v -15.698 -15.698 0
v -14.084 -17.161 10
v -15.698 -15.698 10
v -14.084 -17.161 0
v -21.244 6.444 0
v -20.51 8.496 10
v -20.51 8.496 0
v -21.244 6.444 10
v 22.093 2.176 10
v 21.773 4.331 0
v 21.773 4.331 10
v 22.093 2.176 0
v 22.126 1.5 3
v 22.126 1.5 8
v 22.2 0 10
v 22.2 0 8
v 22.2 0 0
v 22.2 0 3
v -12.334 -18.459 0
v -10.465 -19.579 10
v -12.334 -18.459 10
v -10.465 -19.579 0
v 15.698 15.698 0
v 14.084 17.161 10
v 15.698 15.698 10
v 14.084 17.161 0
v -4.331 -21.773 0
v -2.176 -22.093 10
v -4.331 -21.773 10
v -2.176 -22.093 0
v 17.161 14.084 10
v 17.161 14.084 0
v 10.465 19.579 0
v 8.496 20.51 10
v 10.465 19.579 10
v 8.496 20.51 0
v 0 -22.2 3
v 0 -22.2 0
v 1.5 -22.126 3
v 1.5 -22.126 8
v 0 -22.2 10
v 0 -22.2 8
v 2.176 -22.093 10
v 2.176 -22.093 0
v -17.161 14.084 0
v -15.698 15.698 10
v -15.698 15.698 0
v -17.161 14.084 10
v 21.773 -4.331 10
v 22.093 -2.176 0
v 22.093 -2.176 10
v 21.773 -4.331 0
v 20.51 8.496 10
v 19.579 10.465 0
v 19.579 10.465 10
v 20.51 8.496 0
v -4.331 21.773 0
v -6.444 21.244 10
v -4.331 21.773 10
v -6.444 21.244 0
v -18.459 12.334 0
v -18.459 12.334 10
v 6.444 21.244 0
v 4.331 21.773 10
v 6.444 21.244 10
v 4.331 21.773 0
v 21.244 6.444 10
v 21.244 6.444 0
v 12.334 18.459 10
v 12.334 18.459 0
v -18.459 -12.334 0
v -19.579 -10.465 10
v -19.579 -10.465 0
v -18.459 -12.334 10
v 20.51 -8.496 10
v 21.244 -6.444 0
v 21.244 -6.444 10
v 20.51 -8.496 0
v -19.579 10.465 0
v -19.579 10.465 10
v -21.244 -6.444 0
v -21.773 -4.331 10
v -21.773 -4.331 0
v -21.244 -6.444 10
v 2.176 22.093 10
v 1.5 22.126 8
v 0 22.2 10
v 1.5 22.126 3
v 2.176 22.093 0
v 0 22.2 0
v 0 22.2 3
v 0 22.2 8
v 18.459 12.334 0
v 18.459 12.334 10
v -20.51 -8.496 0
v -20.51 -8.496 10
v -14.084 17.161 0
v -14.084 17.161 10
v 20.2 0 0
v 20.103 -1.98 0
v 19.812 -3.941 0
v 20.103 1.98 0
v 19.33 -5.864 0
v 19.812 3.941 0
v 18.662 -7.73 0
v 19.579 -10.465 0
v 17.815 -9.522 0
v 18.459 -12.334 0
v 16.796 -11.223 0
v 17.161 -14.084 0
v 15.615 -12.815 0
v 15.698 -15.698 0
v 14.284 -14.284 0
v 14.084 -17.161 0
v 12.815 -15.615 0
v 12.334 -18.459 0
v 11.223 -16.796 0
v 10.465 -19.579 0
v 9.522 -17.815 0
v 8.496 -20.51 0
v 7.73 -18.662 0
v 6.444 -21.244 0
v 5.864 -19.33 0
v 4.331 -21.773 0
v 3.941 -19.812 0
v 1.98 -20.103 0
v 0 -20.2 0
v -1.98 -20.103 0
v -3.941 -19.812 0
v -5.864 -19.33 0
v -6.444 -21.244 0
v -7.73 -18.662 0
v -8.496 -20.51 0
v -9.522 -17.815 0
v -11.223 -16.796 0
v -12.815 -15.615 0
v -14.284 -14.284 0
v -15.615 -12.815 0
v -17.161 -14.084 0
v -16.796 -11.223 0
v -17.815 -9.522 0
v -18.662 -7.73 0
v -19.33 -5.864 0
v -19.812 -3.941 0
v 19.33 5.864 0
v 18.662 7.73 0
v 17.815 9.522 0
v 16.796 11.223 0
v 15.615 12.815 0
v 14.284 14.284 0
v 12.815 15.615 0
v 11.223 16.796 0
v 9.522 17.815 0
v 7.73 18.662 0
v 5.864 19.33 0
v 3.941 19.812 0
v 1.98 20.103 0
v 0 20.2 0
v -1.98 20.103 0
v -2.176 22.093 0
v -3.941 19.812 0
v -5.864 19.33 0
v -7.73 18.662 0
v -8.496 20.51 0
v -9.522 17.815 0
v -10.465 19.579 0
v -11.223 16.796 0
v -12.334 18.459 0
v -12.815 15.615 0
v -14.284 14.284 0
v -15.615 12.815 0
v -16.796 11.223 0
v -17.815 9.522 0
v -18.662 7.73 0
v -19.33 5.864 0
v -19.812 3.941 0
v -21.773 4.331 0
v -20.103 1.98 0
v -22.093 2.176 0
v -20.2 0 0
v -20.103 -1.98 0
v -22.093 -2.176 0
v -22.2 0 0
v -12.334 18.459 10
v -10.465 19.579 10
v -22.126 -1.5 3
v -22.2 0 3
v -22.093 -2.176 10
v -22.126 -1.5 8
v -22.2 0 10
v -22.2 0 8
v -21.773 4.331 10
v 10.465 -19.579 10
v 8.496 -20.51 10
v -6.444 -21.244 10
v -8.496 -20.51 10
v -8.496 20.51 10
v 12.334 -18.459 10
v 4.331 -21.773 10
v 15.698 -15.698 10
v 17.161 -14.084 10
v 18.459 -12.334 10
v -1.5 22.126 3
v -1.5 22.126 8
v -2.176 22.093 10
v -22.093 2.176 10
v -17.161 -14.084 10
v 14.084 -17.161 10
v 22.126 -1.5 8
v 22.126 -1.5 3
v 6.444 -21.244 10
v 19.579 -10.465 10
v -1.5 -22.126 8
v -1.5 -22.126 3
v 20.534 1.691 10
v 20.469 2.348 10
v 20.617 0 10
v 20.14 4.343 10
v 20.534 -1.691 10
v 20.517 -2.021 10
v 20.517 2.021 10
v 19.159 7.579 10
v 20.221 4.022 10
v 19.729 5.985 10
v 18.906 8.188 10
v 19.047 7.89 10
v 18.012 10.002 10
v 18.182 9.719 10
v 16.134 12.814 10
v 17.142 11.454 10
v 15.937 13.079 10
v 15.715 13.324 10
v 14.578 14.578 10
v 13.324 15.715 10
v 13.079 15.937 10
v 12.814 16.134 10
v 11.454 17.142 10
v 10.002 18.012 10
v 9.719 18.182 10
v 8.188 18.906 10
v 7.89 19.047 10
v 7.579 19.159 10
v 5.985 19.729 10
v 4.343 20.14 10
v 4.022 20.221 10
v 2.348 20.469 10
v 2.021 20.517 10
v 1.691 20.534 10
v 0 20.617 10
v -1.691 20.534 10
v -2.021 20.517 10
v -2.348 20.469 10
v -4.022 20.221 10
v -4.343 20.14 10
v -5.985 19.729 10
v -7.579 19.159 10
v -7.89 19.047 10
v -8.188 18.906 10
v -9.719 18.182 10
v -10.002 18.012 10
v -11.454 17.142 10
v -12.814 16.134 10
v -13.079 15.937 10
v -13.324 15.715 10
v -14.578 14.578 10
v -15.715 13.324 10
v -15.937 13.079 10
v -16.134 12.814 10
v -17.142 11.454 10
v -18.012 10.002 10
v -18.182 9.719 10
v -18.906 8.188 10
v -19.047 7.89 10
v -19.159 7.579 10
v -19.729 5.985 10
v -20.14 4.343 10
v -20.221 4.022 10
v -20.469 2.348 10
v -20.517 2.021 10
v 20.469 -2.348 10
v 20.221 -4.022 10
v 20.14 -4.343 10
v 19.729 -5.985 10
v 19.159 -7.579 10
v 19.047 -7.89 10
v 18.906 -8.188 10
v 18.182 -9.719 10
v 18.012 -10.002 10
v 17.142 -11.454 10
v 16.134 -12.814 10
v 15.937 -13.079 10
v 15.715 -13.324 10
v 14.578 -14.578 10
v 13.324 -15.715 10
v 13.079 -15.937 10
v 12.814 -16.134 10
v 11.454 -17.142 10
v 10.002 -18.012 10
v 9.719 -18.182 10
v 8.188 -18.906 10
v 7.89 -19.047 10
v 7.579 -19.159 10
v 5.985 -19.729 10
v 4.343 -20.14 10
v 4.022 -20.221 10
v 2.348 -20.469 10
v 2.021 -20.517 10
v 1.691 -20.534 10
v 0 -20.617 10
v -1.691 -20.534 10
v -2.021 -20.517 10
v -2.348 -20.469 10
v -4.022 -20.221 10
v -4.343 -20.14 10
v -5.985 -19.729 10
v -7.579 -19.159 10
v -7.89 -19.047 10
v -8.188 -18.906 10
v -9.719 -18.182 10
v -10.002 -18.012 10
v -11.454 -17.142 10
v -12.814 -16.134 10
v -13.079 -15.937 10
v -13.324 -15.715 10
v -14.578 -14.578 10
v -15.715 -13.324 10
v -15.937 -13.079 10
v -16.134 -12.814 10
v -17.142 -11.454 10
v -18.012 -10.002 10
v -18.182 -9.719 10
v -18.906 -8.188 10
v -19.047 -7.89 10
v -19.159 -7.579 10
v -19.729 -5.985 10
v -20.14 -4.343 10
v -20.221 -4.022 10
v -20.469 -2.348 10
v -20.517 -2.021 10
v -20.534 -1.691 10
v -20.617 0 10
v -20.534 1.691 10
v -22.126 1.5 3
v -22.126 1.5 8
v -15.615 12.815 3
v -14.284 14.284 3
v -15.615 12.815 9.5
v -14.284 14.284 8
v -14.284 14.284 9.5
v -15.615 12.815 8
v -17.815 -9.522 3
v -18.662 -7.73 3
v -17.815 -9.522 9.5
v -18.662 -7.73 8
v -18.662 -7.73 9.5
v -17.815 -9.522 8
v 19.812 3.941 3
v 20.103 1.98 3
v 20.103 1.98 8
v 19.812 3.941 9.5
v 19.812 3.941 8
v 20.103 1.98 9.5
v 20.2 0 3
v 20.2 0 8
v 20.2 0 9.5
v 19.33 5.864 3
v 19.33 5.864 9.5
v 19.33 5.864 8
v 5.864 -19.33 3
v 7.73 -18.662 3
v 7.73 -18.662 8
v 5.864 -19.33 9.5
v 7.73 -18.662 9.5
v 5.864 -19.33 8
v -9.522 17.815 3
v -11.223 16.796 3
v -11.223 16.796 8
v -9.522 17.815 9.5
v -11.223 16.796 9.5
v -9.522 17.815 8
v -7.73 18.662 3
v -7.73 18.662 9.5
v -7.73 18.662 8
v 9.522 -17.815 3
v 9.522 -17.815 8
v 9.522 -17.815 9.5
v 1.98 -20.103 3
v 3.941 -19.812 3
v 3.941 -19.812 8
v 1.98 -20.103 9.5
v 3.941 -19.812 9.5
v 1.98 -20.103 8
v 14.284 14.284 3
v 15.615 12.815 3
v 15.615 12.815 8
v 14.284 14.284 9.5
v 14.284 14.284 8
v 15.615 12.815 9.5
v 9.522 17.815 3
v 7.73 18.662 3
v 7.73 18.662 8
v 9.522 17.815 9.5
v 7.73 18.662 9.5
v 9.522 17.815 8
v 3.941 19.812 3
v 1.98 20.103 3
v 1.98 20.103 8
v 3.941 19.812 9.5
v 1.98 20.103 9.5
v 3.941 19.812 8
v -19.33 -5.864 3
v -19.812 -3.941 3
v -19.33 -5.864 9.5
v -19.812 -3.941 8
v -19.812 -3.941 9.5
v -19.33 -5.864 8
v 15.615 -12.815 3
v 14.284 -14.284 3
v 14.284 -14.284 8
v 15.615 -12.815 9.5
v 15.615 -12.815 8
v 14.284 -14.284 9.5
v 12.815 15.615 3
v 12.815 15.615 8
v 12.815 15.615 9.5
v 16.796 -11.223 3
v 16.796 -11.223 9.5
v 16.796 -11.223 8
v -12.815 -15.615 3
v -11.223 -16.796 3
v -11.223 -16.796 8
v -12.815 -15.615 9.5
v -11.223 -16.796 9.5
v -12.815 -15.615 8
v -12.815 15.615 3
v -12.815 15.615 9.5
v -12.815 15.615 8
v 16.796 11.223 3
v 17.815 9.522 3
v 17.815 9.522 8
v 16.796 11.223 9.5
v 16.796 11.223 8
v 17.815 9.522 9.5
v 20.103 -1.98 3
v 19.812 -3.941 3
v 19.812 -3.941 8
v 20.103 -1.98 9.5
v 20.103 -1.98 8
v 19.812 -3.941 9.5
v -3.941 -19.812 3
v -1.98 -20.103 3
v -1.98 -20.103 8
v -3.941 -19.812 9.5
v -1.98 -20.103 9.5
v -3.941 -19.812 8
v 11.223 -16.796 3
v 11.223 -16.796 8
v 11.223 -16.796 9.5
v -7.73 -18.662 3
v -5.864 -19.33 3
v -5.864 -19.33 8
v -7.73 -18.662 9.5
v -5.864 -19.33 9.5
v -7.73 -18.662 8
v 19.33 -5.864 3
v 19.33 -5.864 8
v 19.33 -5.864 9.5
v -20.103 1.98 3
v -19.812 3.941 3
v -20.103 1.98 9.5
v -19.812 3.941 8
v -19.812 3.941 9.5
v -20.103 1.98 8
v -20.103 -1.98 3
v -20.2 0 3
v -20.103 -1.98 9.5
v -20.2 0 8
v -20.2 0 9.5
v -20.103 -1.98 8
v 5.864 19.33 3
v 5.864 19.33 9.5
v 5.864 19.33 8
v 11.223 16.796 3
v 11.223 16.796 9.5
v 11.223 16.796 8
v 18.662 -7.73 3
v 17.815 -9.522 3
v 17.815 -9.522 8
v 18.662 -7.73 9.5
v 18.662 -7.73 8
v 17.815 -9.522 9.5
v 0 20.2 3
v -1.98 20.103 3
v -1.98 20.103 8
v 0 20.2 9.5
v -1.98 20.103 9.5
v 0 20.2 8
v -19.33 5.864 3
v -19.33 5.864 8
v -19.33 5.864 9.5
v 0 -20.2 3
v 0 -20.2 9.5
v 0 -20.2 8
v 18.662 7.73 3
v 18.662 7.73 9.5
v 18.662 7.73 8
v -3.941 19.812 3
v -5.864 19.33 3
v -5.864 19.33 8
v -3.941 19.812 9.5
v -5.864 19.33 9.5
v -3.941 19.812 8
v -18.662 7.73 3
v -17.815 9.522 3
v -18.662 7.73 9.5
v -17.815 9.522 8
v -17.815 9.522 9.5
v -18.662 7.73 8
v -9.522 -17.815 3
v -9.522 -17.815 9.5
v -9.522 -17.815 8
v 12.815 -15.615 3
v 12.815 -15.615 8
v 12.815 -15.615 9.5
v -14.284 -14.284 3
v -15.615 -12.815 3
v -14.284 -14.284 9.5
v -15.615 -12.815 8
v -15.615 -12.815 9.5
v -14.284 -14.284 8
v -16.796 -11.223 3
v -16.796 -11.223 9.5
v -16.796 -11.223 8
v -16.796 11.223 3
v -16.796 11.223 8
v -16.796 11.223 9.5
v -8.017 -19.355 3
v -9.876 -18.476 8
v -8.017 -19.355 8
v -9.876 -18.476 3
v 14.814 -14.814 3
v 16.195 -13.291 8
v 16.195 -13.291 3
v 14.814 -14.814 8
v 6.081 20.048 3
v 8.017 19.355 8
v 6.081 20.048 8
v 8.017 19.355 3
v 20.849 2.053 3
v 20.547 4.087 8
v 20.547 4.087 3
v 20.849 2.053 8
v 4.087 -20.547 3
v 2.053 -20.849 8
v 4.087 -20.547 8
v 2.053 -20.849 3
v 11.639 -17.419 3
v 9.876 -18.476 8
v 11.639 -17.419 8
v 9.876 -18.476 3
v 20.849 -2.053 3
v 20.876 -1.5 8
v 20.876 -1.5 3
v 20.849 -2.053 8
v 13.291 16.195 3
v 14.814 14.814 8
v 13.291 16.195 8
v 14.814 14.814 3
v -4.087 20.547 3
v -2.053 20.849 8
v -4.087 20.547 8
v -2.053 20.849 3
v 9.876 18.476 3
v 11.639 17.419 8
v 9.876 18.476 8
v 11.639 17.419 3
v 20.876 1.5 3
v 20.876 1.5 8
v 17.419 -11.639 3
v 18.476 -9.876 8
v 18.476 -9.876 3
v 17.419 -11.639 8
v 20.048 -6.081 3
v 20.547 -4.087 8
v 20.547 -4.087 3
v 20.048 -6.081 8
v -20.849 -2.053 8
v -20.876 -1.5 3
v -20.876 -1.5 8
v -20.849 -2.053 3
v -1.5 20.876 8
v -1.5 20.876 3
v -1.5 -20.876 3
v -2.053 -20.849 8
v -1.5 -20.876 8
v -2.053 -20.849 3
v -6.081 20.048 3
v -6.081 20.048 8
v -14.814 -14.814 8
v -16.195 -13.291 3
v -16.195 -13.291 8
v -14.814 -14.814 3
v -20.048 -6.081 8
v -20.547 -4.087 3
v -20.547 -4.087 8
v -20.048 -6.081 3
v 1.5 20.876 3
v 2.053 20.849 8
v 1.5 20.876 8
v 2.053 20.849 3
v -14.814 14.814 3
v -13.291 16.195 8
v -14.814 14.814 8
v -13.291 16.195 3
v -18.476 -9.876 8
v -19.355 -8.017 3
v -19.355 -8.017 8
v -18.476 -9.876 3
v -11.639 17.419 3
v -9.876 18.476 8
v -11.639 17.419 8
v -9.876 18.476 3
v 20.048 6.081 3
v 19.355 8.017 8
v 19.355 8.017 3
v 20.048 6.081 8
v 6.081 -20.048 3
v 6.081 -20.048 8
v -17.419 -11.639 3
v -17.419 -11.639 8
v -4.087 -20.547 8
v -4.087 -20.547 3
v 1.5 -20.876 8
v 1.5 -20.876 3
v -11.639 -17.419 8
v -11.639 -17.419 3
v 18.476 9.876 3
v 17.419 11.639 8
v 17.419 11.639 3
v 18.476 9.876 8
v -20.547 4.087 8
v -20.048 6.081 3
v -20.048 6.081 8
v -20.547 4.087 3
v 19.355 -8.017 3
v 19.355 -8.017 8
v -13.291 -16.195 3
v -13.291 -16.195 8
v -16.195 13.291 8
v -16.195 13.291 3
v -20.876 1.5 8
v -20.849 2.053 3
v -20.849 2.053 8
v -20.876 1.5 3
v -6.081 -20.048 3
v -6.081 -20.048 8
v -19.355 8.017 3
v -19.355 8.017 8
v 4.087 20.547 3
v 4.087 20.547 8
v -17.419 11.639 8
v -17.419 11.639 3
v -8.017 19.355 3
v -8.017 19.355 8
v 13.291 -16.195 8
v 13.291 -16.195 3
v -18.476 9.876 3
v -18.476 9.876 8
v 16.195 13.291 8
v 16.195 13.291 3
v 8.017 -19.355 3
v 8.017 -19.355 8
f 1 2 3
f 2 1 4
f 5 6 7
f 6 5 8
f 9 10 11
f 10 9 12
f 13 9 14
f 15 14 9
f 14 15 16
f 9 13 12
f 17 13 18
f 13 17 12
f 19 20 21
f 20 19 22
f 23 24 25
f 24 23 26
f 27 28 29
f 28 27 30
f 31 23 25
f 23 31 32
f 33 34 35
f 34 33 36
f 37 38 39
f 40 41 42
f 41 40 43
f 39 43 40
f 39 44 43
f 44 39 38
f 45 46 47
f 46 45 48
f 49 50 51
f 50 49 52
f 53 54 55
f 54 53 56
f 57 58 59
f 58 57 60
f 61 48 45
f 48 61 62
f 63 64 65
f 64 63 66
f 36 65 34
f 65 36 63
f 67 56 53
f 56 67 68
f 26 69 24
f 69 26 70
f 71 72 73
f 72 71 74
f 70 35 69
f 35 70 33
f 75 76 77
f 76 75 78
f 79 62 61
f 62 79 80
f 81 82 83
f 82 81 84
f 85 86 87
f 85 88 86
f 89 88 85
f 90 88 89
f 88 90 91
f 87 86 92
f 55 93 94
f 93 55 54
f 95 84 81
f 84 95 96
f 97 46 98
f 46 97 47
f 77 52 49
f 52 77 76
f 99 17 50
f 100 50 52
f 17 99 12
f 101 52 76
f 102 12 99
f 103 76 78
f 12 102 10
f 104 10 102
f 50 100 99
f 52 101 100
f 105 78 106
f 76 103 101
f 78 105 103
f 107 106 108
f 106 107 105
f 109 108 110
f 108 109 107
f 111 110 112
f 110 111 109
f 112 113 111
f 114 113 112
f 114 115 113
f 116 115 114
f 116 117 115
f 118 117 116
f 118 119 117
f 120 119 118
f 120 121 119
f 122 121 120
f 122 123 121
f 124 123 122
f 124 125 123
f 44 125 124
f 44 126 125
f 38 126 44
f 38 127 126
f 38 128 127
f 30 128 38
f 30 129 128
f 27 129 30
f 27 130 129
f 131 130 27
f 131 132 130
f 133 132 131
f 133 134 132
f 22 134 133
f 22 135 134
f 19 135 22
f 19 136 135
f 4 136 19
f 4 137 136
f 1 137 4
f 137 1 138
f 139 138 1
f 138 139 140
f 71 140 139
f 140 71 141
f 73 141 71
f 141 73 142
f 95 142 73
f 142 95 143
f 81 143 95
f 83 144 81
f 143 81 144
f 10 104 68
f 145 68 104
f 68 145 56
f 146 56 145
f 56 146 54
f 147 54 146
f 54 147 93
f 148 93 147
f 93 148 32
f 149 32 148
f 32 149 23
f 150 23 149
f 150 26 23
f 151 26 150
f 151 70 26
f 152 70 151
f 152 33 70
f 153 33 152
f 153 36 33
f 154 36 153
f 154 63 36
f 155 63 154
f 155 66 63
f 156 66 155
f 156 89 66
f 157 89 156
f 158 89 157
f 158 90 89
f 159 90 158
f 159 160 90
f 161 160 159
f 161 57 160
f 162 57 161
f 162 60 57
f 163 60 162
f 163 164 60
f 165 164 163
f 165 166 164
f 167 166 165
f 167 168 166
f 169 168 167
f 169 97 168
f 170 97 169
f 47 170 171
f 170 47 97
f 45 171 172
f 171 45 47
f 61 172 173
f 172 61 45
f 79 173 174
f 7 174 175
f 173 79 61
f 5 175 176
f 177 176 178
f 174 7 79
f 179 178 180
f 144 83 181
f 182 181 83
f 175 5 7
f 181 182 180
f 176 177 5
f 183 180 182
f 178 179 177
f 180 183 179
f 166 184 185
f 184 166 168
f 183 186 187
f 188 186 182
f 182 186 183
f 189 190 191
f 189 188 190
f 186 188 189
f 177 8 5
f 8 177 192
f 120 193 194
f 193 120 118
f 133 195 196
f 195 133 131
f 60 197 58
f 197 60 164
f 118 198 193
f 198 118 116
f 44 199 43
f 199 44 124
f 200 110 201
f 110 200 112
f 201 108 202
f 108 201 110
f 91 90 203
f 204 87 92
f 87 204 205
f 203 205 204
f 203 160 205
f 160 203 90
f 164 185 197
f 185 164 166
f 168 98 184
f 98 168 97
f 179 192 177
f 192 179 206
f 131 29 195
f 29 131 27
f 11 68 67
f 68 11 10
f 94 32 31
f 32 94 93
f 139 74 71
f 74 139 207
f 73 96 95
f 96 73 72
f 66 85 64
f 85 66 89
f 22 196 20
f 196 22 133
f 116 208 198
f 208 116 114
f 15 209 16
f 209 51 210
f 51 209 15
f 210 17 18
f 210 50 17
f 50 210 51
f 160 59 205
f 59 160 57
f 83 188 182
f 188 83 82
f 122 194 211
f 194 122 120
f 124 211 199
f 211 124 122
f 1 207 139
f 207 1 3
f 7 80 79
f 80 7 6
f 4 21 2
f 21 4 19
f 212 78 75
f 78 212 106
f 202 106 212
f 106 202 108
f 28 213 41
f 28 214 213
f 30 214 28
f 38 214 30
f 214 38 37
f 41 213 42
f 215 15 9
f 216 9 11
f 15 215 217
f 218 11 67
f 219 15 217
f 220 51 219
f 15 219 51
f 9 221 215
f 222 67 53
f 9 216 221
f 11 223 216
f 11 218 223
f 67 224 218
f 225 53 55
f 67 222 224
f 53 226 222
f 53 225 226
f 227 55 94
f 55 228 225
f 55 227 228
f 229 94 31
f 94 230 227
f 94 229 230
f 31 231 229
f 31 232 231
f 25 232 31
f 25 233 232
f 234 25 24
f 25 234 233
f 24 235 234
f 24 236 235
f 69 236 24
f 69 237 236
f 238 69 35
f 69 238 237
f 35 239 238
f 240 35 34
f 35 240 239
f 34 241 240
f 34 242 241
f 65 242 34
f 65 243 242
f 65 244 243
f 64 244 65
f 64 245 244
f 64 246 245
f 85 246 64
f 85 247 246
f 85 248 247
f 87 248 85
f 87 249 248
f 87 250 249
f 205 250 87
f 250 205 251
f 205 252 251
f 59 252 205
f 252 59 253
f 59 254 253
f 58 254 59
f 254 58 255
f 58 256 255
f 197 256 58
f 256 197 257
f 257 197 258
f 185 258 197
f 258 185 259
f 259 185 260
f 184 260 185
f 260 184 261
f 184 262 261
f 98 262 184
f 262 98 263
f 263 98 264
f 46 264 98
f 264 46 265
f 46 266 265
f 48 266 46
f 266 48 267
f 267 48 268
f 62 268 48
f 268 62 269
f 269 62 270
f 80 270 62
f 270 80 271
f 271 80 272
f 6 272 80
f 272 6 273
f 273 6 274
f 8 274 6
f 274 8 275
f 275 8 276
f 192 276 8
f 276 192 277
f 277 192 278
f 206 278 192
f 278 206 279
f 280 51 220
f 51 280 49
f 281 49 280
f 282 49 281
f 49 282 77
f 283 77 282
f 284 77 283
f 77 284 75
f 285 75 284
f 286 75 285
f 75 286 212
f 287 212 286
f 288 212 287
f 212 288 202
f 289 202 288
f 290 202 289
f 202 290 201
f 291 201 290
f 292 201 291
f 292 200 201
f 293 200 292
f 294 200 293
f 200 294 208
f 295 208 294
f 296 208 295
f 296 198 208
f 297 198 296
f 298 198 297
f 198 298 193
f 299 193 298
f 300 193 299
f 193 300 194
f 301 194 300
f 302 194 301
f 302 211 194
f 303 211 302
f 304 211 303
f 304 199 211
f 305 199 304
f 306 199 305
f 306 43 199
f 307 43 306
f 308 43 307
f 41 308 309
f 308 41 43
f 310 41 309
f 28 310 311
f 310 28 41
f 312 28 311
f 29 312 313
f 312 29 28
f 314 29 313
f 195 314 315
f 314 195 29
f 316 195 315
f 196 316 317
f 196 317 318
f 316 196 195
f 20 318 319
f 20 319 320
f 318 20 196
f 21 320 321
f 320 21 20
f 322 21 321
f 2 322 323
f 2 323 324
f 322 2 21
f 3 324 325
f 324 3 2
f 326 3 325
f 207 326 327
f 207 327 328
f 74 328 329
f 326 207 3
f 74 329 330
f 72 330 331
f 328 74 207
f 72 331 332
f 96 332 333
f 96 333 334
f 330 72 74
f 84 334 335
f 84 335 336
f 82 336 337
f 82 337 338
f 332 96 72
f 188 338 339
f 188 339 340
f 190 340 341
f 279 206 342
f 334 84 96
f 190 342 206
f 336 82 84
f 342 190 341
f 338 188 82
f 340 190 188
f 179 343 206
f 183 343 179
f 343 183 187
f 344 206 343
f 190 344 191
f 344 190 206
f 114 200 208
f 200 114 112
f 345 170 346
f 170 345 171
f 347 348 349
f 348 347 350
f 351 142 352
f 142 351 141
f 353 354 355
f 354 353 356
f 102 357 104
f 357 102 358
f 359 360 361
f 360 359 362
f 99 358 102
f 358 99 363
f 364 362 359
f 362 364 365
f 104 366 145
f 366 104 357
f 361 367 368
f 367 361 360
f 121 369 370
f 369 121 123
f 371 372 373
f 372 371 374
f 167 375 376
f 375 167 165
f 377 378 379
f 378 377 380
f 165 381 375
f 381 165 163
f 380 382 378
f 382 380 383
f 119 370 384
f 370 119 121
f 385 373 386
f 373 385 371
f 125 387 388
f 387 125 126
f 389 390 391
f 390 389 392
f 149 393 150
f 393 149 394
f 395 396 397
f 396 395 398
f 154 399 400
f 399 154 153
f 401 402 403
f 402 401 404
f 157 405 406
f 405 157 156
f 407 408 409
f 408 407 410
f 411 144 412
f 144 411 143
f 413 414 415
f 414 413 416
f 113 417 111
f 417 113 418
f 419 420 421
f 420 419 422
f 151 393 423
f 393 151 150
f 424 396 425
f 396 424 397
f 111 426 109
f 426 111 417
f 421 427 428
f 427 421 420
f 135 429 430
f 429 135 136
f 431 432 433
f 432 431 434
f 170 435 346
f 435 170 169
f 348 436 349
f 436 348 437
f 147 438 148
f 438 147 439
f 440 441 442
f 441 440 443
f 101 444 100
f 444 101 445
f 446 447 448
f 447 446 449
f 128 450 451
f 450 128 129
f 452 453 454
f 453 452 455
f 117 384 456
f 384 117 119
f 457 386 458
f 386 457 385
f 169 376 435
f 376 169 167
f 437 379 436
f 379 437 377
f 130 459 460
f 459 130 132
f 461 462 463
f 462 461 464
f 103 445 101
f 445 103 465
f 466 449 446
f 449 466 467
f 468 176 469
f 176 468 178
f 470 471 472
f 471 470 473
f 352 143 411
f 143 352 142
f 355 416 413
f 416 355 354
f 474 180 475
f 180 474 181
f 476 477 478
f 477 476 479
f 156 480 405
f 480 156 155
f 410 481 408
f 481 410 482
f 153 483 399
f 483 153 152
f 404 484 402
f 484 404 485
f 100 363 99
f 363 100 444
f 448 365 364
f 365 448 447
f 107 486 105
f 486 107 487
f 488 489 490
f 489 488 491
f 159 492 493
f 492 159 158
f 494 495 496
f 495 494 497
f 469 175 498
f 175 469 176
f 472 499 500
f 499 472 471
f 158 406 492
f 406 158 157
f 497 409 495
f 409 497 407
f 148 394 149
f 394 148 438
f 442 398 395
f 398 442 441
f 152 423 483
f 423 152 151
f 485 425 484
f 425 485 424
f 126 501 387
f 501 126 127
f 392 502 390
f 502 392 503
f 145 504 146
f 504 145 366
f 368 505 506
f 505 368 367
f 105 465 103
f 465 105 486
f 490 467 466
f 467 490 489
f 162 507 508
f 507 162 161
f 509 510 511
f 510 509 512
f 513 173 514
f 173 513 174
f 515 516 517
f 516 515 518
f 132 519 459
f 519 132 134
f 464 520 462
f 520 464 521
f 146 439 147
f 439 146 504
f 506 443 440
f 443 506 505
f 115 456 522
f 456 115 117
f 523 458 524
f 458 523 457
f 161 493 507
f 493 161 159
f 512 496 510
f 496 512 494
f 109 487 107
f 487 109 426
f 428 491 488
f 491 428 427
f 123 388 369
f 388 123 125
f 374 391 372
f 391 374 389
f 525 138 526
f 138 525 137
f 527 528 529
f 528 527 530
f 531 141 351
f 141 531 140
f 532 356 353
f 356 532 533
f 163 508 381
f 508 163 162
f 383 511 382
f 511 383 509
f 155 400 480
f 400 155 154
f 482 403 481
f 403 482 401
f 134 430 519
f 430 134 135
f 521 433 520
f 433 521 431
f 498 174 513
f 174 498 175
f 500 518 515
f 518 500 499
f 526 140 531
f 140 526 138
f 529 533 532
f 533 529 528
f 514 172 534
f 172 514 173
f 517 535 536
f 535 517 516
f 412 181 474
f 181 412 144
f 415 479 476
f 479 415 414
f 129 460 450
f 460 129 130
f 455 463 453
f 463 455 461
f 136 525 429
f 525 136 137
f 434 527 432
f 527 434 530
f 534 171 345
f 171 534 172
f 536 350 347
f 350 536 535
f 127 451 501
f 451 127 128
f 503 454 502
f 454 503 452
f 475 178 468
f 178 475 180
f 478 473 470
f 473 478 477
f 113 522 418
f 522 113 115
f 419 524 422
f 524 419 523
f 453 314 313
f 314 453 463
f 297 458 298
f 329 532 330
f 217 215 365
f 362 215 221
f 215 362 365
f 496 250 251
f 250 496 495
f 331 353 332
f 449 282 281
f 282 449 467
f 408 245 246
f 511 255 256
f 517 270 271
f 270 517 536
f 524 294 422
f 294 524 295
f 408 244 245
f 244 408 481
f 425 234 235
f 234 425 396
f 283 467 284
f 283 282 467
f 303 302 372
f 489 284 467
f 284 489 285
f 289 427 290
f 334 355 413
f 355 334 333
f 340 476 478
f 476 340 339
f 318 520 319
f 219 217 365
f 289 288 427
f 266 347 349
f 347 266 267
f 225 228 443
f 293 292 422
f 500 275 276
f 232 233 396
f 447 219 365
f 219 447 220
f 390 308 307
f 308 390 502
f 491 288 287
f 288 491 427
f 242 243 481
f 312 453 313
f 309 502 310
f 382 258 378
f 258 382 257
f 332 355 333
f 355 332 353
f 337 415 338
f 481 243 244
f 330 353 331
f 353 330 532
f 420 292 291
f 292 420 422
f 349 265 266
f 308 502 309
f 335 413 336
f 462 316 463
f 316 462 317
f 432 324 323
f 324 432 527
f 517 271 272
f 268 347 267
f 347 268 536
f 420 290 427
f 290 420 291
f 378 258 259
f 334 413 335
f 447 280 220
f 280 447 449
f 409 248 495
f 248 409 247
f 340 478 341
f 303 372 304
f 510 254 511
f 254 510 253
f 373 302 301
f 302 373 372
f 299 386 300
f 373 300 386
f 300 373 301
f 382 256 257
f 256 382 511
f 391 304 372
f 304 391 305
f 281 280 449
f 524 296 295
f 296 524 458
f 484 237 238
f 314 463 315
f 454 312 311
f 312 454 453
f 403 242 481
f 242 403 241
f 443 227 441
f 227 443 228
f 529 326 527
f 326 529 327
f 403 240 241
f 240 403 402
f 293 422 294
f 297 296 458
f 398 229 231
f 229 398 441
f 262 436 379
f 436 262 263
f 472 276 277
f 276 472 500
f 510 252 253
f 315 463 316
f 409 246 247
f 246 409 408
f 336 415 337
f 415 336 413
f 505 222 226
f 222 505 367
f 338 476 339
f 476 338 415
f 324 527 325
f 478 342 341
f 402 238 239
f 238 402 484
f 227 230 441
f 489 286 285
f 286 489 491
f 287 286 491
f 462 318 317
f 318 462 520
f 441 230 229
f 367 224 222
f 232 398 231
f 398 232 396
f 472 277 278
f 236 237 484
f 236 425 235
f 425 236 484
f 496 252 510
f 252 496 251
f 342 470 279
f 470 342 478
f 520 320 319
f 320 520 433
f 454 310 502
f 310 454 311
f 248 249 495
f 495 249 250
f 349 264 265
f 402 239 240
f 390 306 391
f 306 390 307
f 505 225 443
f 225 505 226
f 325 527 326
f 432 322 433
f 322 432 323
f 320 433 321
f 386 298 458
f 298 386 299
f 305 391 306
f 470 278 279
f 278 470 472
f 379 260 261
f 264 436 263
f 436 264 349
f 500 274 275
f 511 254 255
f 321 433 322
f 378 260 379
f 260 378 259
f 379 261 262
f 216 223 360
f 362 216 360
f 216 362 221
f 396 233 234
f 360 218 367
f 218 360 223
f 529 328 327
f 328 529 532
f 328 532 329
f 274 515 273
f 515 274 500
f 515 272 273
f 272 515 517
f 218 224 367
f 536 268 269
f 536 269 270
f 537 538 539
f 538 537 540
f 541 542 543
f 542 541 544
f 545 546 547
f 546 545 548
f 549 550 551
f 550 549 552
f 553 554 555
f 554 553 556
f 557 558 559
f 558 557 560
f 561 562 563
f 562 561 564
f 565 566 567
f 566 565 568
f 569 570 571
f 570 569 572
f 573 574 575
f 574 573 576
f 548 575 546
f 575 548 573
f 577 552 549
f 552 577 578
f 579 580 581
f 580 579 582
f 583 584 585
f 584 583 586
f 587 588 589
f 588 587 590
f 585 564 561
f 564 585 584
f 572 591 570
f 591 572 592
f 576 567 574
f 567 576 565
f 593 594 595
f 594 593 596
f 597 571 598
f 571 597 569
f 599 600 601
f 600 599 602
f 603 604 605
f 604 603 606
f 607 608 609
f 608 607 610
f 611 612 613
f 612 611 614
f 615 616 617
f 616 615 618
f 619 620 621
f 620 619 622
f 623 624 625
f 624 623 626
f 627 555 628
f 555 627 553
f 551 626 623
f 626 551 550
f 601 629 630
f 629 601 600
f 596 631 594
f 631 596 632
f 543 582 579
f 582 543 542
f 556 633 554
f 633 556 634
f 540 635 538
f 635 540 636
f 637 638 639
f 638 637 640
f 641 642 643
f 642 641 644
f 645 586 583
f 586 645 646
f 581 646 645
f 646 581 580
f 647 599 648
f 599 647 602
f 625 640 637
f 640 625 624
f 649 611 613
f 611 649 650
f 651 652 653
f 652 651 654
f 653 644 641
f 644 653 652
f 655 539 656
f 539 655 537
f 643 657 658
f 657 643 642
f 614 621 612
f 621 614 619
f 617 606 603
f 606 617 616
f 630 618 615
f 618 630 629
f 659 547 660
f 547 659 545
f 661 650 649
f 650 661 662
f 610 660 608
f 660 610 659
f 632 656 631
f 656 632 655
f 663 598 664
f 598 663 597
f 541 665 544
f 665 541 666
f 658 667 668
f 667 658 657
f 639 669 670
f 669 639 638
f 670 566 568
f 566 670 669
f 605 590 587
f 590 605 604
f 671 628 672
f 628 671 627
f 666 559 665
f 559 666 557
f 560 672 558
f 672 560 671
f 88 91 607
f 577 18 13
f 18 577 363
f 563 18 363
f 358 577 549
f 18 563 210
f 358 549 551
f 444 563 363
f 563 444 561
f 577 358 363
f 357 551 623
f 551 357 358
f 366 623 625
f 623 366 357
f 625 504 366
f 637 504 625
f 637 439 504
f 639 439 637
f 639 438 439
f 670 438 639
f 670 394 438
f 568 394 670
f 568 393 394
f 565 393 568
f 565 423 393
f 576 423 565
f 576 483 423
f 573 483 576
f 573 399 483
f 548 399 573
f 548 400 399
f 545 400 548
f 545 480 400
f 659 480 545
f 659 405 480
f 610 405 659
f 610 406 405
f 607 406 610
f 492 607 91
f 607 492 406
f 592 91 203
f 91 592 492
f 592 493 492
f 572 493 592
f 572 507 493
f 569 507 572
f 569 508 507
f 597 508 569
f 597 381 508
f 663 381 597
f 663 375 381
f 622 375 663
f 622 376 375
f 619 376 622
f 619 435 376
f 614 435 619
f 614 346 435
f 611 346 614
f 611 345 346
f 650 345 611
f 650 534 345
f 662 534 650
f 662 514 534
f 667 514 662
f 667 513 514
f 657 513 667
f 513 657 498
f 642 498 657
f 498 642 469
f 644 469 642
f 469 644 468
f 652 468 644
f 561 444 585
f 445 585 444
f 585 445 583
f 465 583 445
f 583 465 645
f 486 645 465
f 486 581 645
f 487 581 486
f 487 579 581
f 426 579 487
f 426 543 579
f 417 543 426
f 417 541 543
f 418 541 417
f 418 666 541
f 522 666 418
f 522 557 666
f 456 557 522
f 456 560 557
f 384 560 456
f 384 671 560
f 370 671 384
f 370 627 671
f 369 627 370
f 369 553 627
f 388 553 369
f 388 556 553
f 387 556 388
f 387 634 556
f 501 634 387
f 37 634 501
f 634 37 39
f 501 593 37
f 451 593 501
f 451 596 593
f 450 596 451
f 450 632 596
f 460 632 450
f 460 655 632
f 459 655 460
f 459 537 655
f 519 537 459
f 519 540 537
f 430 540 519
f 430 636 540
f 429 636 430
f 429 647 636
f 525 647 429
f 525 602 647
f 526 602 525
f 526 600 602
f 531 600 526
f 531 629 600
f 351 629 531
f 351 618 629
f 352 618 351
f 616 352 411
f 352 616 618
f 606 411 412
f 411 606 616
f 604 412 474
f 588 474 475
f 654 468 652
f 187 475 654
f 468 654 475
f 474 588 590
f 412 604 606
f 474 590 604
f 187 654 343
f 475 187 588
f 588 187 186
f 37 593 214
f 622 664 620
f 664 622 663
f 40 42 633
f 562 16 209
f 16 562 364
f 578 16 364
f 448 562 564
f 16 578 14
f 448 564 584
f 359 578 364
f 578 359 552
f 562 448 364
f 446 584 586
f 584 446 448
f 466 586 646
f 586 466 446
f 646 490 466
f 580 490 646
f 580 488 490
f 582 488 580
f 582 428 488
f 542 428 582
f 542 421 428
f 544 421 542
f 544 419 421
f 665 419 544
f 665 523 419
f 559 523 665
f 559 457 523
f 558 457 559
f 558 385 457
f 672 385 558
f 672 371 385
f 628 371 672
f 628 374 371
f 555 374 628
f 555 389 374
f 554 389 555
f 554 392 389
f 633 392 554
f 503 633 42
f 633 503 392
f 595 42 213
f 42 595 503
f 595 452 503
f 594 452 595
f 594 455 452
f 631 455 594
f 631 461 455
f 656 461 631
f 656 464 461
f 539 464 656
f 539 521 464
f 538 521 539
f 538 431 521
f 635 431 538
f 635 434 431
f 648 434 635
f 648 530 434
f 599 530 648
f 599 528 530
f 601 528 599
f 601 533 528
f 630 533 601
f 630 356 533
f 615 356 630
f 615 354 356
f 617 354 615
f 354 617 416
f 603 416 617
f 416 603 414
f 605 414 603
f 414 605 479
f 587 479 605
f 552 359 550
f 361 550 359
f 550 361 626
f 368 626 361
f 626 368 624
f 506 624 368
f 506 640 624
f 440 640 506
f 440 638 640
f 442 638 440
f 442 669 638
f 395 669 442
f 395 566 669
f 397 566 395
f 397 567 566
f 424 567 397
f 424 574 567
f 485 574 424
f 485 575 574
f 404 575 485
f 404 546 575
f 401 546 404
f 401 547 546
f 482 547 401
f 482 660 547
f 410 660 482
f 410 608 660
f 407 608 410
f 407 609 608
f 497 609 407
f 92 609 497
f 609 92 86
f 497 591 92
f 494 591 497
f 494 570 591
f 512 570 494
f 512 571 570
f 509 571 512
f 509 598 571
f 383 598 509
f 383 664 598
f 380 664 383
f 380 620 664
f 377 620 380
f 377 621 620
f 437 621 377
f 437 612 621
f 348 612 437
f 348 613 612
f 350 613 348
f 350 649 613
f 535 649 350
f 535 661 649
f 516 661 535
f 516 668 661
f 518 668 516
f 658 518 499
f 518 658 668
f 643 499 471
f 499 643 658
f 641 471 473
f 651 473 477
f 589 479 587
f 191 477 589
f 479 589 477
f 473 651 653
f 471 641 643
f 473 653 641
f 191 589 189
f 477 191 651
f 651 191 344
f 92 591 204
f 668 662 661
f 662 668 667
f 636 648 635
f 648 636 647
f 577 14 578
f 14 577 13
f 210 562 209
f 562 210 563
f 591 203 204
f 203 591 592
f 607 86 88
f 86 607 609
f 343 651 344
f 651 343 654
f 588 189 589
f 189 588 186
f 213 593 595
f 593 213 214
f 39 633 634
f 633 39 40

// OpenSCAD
$fn=64;
rotatorOutside();

module rotatorOutside() {
    rt = 2;
    h = 10;
    ir = 20.2;
    or = ir+rt;

    difference() {
        cylinder(r=or, h=h);
        translate([0,0,-0.05]) cylinder(r=ir, h=h+0.1);
        translate([0,0,h-0.5]) cylinder(r1=ir, r2=ir+0.5, h=0.6);
        translate([0,0,3]) cylinder(r=ir+0.75,h=5);
        pip(ir);
        rotate([0,0,90]) pip(ir);
        rotate([0,0,180]) pip(ir);
        rotate([0,0,270]) pip(ir);
    }
}

module pip(tr) {
  translate([tr+0.25,-1.5,3]) cube([3,3,5]);
}
